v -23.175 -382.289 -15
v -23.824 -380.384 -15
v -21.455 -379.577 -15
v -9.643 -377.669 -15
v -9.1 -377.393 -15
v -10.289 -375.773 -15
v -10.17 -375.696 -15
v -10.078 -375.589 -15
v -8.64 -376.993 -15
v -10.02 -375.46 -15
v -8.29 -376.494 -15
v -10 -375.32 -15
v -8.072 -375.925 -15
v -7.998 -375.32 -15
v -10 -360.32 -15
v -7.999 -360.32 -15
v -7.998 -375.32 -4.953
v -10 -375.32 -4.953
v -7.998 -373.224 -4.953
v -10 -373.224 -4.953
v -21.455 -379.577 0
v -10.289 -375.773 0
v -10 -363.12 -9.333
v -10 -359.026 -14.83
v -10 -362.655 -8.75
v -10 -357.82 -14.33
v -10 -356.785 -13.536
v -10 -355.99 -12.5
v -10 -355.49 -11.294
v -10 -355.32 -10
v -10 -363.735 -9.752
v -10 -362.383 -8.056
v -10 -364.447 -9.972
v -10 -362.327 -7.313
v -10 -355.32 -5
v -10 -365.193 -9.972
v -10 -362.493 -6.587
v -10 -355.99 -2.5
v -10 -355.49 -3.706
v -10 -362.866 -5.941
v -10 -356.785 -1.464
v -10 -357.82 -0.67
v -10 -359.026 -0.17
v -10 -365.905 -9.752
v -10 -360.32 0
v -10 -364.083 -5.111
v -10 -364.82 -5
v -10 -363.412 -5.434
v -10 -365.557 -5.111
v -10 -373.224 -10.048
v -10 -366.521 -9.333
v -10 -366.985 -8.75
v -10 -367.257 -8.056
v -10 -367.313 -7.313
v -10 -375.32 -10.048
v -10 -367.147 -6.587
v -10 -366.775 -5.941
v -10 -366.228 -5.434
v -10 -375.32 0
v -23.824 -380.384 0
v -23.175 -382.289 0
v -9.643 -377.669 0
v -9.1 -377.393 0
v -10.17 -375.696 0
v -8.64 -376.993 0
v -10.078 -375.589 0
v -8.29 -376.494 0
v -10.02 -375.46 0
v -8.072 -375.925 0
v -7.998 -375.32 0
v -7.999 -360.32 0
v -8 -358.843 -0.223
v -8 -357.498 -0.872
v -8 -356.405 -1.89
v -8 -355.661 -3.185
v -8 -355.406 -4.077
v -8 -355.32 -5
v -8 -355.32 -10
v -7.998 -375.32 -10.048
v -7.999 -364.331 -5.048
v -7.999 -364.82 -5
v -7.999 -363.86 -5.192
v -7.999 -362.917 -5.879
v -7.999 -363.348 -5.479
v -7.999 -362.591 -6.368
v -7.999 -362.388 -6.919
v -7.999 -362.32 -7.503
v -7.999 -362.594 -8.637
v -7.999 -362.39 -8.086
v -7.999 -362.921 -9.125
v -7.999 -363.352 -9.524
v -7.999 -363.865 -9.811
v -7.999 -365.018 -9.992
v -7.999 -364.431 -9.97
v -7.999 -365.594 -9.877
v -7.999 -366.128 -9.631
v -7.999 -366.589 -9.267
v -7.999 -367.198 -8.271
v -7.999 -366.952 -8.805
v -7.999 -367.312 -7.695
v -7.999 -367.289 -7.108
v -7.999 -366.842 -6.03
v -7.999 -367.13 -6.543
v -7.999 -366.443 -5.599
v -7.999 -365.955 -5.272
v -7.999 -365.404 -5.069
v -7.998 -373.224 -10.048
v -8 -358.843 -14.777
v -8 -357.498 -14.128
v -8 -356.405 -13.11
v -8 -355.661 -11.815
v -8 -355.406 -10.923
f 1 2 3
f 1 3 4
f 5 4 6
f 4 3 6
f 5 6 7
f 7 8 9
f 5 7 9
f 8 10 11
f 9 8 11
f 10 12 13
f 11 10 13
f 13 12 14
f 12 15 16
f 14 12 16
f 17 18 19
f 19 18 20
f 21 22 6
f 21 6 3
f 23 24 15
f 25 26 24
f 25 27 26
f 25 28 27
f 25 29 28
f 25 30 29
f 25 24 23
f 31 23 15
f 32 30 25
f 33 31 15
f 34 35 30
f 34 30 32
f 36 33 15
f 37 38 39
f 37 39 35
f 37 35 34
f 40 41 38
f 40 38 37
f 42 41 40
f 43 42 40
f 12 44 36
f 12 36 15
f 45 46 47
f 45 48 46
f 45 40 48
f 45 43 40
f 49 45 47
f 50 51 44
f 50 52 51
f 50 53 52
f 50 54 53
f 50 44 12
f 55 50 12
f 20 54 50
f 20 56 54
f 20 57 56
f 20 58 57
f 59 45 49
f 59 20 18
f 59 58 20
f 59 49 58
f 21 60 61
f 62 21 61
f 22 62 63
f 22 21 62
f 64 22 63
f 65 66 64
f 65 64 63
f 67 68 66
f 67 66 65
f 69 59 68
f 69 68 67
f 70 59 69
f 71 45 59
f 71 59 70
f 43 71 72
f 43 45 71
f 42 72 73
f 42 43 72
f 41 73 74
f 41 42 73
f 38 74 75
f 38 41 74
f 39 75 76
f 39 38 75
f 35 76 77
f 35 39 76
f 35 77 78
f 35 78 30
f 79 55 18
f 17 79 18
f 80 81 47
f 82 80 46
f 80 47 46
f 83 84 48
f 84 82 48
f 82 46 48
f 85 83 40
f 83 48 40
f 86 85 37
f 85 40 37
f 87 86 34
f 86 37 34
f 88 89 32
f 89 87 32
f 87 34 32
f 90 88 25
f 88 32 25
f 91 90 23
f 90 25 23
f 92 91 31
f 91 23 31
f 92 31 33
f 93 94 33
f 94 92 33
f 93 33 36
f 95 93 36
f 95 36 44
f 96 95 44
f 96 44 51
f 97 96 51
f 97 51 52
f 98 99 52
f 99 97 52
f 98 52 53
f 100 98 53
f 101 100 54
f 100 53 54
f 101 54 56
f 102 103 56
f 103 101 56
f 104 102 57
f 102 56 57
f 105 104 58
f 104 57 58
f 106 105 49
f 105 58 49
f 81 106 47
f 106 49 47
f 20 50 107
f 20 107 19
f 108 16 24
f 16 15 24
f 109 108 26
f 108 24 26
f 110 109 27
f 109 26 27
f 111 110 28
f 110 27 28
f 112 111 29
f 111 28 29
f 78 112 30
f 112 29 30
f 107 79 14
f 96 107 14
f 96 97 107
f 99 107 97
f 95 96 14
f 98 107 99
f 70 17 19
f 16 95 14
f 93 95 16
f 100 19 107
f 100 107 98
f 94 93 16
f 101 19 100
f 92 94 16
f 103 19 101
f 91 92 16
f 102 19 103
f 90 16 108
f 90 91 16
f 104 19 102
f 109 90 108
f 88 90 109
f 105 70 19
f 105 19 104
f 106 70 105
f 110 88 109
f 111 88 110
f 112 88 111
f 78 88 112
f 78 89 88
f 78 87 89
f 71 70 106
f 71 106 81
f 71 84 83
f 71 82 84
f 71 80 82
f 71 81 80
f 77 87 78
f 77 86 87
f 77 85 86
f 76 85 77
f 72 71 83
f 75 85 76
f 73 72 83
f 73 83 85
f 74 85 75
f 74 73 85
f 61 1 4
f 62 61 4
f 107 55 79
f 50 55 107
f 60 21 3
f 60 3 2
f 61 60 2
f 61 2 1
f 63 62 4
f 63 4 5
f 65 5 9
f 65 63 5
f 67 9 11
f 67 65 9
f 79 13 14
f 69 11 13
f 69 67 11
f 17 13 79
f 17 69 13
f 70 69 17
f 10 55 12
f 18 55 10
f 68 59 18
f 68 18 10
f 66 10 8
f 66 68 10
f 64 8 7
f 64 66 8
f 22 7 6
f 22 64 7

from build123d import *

# Parameters (mm, degrees)
DODANIE_WYCI_GNI_CIE1_DEPTH = 15
SZKIC2_R                    = 2.5
WYTNIJ_WYCI_GNI_CIE2_DEPTH  = 15
SZKIC4_W                    = 5.095426068
SZKIC4_H                    = 2.09659
WYTNIJ_WYCI_GNI_CIE4_DEPTH  = 15
ZAOKR_GLENIE1_R             = 5


with BuildPart() as part:
    # Szkic1 → Dodanie-wyciągnięcie1 (new body)
    with BuildSketch(Plane.XY):
        with BuildLine():
            Line((-21.454955104, -379.577351541), (-23.824138202, -380.384479307))
            Line((-23.824138202, -380.384479307), (-23.175429976, -382.288649415))
            Line((-23.175429976, -382.288649415), (-9.642739559, -377.669332371))
            ThreePointArc((-9.642739559, -377.669332371), (-8.449909807, -376.75404191), (-7.997789918, -375.320100819))
            Line((-7.997789918, -375.320100819), (-8, -355.320100819))
            Line((-8, -355.320100819), (-10, -355.320100819))
            Line((-10, -355.320100819), (-10, -375.320100819))
            ThreePointArc((-10, -375.320100819), (-10.078304277, -375.588750623), (-10.288690869, -375.773254713))
            Line((-10.288690869, -375.773254713), (-21.454955104, -379.577351541))
        make_face()
    extrude(amount=-DODANIE_WYCI_GNI_CIE1_DEPTH)

    # Szkic2 → Wytnij-wyciągnięcie2 (cut)
    with BuildSketch(Plane.ZY.offset(10)):
        with Locations((-7.5, -364.820100819)):
            Circle(SZKIC2_R)
    extrude(amount=-WYTNIJ_WYCI_GNI_CIE2_DEPTH, mode=Mode.SUBTRACT)

    # Szkic4 → Wytnij-wyciągnięcie4 (cut)
    with BuildSketch(Plane.ZY.offset(10)):
        with Locations((-7.500510709, -374.271805819)):
            Rectangle(SZKIC4_W, SZKIC4_H)
    extrude(amount=-WYTNIJ_WYCI_GNI_CIE4_DEPTH, mode=Mode.SUBTRACT)

    # Zaokrąglenie1
    zaokr_glenie1_edges = [part.edges().sort_by_distance(p)[0] for p in [
        (-9, -355.320100819, 0),
        (-9, -355.320100819, -15),
    ]]
    fillet(zaokr_glenie1_edges, radius=ZAOKR_GLENIE1_R)


solid = part.part
